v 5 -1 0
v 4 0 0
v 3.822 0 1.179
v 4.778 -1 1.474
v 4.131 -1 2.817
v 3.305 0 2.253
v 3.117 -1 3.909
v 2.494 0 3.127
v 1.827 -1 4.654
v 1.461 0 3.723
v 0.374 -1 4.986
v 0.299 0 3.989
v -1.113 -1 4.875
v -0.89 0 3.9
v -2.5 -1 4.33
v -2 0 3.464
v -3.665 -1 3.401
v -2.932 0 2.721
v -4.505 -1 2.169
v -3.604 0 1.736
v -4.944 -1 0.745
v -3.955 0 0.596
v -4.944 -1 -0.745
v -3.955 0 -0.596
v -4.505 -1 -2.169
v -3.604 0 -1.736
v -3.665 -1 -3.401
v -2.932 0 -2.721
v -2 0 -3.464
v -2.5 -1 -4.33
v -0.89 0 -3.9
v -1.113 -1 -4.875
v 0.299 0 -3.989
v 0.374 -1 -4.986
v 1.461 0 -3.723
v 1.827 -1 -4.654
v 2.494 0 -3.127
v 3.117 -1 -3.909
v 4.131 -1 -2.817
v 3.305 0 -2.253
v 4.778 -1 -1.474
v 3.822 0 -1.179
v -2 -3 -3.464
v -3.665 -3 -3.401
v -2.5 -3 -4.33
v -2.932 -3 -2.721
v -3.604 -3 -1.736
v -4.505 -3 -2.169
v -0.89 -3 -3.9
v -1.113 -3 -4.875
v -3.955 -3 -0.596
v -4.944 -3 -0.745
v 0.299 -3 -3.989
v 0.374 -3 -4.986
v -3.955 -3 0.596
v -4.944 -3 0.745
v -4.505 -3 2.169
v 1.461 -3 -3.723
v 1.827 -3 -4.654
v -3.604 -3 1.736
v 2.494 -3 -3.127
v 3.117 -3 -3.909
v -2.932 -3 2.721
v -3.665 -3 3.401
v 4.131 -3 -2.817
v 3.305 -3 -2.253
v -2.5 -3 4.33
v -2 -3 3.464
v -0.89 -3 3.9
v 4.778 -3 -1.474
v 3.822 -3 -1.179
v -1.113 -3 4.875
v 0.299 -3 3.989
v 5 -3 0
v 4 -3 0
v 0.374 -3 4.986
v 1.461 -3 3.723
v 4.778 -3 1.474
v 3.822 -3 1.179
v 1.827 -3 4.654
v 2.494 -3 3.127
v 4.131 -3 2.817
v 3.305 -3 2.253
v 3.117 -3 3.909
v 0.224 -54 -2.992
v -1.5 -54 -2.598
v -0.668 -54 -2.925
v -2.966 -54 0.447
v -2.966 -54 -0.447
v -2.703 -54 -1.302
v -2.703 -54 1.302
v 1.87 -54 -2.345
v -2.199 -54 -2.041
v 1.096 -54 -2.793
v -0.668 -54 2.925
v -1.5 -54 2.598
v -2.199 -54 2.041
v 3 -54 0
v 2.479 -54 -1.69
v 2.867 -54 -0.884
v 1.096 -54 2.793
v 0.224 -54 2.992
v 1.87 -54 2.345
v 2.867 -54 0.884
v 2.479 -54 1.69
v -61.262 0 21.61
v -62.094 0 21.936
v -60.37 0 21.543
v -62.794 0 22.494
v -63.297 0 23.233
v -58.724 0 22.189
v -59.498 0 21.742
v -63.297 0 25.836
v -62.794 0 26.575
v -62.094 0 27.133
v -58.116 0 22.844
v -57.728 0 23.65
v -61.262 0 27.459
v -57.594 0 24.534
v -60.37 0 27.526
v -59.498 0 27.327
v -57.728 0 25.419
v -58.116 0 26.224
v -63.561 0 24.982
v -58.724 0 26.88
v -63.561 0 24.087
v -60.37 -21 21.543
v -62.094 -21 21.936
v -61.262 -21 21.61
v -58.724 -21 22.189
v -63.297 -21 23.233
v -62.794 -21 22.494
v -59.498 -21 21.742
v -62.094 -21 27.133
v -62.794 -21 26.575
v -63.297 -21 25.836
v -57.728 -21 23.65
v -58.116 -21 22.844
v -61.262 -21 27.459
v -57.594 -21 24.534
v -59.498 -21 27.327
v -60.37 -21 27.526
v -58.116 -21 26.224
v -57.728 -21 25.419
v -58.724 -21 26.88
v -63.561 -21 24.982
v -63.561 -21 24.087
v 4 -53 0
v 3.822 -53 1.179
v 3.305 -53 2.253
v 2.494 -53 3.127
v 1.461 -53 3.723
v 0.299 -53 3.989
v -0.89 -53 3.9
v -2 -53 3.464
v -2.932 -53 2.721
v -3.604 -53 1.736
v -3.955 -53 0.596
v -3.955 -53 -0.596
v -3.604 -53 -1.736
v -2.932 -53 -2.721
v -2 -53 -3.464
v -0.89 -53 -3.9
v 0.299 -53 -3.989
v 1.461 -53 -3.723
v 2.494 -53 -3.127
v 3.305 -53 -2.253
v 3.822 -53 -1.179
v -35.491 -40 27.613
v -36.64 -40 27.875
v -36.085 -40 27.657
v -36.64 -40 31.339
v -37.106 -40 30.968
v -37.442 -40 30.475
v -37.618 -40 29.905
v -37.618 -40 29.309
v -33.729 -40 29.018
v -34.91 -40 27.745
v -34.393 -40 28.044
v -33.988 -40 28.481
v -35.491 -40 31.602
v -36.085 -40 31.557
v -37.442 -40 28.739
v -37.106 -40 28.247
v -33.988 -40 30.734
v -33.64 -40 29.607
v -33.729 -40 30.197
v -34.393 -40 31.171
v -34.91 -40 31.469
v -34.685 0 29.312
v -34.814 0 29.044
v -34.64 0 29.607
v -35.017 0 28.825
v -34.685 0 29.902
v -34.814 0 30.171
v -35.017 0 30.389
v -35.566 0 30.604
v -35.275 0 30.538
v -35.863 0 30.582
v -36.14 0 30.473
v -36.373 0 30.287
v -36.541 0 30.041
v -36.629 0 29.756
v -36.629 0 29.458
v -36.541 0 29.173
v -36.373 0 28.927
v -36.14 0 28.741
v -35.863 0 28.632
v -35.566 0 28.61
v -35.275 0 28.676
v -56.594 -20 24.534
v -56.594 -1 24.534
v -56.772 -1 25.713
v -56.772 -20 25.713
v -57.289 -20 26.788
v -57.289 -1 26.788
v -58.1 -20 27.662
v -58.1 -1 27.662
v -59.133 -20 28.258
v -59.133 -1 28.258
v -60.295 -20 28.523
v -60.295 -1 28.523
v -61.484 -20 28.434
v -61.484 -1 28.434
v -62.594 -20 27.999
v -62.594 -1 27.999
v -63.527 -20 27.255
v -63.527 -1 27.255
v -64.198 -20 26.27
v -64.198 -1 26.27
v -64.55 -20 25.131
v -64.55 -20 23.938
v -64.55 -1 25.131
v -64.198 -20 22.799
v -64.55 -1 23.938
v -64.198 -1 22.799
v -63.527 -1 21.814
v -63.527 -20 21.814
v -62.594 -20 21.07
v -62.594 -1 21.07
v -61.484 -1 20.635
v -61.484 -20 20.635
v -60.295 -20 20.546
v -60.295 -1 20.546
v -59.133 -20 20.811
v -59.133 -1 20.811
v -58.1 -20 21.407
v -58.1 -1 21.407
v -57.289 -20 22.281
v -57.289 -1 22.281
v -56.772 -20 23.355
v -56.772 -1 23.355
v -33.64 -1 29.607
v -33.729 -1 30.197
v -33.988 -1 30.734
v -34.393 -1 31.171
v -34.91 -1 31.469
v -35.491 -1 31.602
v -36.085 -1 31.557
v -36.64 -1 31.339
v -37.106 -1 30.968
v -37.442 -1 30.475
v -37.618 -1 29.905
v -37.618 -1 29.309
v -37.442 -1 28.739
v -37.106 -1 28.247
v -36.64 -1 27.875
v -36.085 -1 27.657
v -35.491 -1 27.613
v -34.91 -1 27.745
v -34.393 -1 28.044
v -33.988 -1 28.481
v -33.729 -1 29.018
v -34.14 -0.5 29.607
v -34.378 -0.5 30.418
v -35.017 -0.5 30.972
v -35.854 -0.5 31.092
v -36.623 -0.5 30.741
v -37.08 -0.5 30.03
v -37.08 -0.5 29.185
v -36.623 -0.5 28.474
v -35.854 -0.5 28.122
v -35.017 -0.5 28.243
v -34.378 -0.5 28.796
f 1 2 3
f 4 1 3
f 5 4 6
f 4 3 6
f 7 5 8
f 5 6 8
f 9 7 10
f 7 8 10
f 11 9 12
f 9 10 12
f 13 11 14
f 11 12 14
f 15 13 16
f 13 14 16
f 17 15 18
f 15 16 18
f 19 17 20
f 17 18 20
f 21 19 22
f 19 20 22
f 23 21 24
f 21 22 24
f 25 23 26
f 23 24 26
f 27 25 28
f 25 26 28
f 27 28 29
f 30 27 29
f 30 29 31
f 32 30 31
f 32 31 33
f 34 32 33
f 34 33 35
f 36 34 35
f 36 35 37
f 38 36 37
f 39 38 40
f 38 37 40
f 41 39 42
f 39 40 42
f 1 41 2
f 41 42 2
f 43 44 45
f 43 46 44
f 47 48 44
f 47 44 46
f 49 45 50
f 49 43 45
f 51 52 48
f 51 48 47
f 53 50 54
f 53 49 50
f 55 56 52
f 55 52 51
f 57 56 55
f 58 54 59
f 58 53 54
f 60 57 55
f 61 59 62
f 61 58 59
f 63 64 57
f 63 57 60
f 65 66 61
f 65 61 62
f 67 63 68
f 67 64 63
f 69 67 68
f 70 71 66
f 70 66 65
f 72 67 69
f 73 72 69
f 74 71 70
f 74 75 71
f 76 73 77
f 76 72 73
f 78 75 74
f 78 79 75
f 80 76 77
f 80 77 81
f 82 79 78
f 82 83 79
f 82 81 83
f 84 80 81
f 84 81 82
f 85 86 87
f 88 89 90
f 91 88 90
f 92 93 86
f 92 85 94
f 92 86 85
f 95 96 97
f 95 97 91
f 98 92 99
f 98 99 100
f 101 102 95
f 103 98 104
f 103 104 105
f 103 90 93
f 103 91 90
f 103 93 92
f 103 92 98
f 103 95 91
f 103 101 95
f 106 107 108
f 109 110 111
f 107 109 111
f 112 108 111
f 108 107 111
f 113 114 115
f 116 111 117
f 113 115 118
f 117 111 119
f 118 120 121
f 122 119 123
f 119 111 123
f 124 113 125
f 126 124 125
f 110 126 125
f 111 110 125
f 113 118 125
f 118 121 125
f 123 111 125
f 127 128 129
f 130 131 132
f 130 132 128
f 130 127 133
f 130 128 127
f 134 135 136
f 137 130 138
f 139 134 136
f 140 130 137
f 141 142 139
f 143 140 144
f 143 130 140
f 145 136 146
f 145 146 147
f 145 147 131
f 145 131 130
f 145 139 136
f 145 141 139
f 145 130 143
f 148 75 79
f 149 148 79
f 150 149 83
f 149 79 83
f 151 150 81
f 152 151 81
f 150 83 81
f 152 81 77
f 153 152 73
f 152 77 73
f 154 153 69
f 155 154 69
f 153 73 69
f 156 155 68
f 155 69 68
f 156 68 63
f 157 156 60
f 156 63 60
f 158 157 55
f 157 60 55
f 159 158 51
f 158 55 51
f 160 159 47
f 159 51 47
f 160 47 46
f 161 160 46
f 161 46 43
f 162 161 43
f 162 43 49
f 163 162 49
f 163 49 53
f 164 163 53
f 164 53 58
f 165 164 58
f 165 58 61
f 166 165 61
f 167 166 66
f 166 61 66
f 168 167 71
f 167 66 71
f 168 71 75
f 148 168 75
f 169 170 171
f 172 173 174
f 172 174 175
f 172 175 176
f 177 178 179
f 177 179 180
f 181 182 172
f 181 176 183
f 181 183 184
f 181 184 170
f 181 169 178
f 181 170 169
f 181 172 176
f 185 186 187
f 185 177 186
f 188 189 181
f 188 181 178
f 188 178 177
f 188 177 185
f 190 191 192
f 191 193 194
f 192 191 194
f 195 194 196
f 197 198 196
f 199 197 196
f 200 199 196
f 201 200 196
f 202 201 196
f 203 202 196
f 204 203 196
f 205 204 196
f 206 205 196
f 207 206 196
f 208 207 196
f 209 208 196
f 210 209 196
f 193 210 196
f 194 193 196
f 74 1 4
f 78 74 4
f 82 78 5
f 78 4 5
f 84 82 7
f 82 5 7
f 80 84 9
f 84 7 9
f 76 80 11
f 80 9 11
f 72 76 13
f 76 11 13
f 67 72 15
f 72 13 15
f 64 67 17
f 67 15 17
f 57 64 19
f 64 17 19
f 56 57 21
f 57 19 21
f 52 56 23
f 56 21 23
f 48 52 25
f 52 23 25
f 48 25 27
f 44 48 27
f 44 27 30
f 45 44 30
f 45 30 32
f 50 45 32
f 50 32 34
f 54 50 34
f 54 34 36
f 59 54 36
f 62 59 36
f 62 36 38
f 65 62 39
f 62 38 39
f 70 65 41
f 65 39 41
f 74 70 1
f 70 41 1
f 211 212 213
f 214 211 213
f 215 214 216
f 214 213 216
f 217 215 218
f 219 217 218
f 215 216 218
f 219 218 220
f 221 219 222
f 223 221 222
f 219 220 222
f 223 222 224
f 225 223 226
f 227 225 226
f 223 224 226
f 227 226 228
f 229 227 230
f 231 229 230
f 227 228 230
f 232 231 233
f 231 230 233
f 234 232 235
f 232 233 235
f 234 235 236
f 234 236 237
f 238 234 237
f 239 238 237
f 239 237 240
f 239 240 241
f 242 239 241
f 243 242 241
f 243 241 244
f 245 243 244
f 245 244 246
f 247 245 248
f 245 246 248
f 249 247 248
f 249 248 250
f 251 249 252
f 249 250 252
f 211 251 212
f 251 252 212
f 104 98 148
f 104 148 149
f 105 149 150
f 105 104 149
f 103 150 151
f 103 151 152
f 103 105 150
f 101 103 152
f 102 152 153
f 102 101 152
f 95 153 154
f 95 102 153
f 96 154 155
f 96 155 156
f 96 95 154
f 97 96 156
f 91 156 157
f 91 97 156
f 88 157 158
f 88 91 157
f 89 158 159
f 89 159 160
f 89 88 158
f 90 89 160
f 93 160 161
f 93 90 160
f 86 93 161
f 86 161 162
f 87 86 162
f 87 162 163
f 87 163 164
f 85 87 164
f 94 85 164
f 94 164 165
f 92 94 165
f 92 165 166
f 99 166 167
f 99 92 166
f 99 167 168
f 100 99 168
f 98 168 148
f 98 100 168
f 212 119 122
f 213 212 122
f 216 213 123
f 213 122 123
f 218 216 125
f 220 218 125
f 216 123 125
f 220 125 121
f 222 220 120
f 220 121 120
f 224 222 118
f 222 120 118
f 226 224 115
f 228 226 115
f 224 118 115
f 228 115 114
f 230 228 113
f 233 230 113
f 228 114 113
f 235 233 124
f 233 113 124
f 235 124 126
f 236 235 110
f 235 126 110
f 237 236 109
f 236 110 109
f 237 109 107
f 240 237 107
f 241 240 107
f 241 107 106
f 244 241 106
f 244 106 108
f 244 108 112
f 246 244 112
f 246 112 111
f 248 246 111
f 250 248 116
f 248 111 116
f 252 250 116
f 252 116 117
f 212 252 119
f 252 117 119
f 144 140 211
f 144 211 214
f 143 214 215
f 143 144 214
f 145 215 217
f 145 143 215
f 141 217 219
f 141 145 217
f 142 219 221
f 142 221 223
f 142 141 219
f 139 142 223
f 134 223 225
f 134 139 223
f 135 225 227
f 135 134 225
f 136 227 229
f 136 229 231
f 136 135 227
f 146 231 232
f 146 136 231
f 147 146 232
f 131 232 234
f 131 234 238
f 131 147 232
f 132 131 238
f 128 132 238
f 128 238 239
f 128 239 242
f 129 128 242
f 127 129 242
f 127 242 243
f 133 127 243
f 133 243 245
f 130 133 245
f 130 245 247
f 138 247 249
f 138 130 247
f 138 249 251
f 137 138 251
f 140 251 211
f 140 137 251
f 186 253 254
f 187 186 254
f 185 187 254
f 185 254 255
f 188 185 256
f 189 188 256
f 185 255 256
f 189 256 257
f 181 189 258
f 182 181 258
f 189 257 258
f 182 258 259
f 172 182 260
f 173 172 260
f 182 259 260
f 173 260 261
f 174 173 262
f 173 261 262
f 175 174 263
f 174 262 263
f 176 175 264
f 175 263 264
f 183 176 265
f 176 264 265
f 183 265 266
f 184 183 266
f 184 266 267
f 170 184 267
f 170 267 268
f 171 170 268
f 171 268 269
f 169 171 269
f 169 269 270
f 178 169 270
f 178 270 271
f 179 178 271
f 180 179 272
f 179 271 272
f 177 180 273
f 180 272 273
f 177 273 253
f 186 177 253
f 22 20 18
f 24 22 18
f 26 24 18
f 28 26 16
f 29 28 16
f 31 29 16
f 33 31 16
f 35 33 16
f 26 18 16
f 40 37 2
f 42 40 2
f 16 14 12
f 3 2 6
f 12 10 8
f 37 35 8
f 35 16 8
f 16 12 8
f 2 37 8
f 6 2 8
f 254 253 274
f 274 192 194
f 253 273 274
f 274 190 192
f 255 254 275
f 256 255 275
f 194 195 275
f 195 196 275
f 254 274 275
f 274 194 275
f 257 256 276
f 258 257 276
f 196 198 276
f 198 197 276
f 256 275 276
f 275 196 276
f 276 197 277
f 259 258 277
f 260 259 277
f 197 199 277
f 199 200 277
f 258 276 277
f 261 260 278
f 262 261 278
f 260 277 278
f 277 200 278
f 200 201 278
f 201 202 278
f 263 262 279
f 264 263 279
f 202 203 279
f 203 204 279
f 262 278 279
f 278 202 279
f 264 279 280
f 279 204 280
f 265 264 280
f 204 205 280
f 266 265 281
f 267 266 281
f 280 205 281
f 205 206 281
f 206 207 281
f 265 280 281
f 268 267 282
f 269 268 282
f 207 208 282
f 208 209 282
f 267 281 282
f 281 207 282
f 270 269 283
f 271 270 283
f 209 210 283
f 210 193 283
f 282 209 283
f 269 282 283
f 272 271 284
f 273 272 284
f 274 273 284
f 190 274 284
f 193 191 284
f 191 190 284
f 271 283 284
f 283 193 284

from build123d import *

# Parameters (mm, degrees)
F0_R      = 5
F1_DEPTH  = 3
F2_R      = 4
F3_DEPTH  = 51
F4_R      = 4
F5_DEPTH  = 21
F6_R      = 2
F7_DEPTH  = 40
F8_SIZE   = 1
F8_2_SIZE = 1
F8_3_SIZE = 1


with BuildPart() as f1:
    # F0 (on Front) → F1 (new body)
    with BuildSketch(Plane.XZ):
        Circle(F0_R)
    extrude(amount=F1_DEPTH)

    # F2 (on face) → F3 (join)
    with BuildSketch(Plane.XZ.offset(3)):
        Circle(F2_R)
    extrude(amount=F3_DEPTH)

    # F8
    f8_edges = [f1.edges().sort_by_distance(p)[0] for p in [
        (-5, 0, 0),
        (-4, -54, 0),
    ]]
    chamfer(f8_edges, length=F8_SIZE)


with BuildPart() as f5:
    # F4 (on Front) → F5 (new body)
    with BuildSketch(Plane.XZ):
        with Locations((-60.59441, 24.534458)):
            Circle(F4_R)
    extrude(amount=F5_DEPTH)

    # F8#2
    f8_2_edges = [f5.edges().sort_by_distance(p)[0] for p in [
        (-64.59441, -21, 24.534458),
        (-64.59441, 0, 24.534458),
    ]]
    chamfer(f8_2_edges, length=F8_2_SIZE)


with BuildPart() as f7:
    # F6 (on Front) → F7 (new body)
    with BuildSketch(Plane.XZ):
        with Locations((-35.640374, 29.607227)):
            Circle(F6_R)
    extrude(amount=F7_DEPTH)

    # F8#3
    f8_3_edges = [f7.edges().sort_by_distance(p)[0] for p in [
        (-37.640374, 0, 29.607227),
    ]]
    chamfer(f8_3_edges, length=F8_3_SIZE)


solid = Compound([f1.part, f5.part, f7.part])
